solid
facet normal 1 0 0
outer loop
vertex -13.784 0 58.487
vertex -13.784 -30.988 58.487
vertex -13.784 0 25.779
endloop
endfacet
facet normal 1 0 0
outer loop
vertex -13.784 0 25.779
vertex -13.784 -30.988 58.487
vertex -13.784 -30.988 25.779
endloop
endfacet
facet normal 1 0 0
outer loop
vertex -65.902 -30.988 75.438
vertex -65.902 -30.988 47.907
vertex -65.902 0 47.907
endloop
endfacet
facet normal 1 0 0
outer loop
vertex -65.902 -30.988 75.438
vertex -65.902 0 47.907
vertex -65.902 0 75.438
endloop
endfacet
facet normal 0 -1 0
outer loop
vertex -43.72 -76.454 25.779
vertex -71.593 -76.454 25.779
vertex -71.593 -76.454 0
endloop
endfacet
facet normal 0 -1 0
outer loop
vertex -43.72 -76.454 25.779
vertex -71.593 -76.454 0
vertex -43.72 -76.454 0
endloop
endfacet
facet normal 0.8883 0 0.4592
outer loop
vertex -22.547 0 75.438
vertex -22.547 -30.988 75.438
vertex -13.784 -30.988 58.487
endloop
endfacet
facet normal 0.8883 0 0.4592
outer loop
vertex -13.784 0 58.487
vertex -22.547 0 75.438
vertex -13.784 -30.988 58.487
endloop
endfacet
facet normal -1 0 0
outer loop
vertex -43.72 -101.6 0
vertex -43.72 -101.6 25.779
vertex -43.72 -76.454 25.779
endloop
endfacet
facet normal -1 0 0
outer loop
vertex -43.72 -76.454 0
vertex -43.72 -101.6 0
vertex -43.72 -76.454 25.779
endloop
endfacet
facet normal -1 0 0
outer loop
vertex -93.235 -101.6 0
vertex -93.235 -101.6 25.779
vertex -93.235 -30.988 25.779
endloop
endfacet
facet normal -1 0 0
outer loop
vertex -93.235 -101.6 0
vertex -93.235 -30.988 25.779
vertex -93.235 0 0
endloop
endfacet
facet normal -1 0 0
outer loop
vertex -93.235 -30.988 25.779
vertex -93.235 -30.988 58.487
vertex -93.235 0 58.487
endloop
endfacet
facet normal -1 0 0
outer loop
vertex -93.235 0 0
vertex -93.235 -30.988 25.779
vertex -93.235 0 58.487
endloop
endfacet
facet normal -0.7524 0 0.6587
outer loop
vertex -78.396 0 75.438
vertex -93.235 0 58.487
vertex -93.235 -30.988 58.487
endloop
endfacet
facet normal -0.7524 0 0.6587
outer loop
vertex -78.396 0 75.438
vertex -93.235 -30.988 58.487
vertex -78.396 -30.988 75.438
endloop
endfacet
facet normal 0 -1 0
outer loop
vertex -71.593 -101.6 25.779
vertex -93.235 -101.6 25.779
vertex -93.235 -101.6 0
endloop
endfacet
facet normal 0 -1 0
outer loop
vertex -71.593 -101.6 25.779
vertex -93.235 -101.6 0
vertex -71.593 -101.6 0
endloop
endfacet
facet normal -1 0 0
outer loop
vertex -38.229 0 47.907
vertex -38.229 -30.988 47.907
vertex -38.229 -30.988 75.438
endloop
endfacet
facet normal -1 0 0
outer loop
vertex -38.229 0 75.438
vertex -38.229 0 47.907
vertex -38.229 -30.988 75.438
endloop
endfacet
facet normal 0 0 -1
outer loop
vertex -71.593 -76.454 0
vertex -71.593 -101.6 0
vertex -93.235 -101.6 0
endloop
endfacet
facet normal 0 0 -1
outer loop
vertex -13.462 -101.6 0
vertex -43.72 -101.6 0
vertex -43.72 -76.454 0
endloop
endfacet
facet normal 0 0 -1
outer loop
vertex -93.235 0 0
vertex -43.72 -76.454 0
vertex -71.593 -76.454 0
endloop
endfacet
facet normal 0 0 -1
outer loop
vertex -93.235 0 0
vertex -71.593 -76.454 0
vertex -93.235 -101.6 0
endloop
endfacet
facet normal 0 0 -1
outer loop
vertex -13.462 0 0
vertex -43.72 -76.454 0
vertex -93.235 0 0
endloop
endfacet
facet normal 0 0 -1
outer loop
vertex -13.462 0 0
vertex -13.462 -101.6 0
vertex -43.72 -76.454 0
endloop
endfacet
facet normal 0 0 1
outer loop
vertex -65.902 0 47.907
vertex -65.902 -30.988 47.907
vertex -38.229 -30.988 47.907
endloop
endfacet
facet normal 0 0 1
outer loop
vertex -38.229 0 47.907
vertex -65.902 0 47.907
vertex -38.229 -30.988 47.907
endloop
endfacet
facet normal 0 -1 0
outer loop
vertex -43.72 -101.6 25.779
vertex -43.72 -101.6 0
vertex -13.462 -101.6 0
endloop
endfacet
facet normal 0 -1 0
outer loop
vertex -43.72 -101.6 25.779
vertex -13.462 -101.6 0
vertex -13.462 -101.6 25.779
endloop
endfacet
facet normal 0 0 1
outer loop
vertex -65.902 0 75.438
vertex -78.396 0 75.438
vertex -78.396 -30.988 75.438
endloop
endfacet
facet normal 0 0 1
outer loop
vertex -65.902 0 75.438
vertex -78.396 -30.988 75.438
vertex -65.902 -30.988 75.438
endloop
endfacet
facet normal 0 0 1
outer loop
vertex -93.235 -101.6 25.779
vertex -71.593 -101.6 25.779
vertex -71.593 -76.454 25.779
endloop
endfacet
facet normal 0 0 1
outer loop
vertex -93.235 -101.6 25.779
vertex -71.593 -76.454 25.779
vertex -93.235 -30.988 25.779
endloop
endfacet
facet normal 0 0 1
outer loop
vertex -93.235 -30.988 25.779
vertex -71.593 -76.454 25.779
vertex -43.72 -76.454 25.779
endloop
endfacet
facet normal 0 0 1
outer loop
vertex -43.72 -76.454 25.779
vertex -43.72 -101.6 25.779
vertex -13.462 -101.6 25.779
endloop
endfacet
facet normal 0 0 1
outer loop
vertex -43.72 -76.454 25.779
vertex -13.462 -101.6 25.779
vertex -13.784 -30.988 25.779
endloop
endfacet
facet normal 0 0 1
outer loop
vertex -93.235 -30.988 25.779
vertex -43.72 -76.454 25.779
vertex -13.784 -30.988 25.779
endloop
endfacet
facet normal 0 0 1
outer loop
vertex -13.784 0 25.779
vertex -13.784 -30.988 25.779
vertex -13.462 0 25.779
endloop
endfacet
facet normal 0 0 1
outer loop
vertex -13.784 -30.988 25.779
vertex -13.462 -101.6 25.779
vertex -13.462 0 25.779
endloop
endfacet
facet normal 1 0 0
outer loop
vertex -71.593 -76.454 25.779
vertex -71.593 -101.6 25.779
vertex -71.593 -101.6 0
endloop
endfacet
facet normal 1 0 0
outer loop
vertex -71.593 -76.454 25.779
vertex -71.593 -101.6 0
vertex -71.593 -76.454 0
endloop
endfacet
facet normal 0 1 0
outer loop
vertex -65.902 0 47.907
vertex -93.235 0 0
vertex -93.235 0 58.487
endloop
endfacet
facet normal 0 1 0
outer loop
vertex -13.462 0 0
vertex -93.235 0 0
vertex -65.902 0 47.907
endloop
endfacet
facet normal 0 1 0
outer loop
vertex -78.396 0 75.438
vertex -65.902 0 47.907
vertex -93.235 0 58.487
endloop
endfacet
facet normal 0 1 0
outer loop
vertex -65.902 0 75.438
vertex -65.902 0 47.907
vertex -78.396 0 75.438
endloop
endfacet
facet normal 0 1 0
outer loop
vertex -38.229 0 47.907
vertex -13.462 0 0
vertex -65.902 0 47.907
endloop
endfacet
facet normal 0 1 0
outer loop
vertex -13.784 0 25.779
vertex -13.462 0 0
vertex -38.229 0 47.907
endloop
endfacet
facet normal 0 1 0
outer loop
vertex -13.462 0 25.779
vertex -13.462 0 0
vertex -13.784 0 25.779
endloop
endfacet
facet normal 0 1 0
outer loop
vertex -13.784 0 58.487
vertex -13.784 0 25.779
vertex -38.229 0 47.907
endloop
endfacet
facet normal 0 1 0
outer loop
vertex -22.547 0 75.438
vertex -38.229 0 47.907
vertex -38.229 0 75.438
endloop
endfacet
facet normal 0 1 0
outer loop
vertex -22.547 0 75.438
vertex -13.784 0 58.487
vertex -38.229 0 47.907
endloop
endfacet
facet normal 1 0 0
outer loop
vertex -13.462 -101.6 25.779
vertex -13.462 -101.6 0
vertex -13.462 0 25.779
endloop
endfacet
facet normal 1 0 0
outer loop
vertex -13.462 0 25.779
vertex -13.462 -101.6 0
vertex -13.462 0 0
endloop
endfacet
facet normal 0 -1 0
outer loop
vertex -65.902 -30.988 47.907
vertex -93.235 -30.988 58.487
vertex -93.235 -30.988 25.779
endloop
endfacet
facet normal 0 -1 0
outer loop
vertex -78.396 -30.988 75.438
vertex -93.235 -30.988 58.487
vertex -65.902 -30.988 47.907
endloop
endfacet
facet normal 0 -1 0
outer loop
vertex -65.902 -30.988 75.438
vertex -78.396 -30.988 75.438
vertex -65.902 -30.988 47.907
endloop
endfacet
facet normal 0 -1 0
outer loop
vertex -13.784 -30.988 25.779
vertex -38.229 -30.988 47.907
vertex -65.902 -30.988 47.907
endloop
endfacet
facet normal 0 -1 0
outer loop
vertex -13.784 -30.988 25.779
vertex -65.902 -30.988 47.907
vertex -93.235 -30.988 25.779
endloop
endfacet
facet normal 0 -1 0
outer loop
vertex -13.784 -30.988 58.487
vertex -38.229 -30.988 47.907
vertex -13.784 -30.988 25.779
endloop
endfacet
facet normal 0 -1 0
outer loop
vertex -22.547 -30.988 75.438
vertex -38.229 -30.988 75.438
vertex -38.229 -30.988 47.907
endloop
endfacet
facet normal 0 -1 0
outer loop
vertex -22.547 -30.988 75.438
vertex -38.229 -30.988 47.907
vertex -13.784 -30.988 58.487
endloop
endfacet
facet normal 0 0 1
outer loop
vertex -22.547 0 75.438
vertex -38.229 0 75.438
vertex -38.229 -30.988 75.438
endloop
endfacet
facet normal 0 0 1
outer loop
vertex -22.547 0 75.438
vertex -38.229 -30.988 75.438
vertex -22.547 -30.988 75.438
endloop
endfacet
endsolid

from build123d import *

# Parameters (mm, degrees)
F0_W      = 101.6
F0_H      = 101.6
F1_DEPTH  = 75.438
F2_W      = 28.0288234353
F2_H      = 9.1542927548
F3_DEPTH  = 25.4
F4_W      = 101.6
F4_H      = 49.6587024246
F5_DEPTH  = 70.612
F6_W      = 27.8729833663
F6_H      = 25.5314931273
F7_DEPTH  = 25.146
F9_DEPTH  = 68.072
F10_DEPTH = 25.4
F12_DEPTH = 60.96
F13_W     = 27.6737101376
F13_H     = 27.5311653678
F14_DEPTH = 72.136
F15_DEPTH = 13.716
F16_DEPTH = 13.462
F18_DEPTH = 43.434


with BuildPart() as f1:
    # F0 (on Top) → F1 (new body)
    with BuildSketch(Plane.XY):
        with Locations((-50.8, -50.8)):
            Rectangle(F0_W, F0_H)
    extrude(amount=F1_DEPTH)

    # F2 (on face) → F3 (cut)
    with BuildSketch(Plane.XZ.offset(101.6)):
        with Locations((-57.5784109533, -4.5771463774)):
            Rectangle(F2_W, F2_H)
    extrude(amount=-F3_DEPTH, mode=Mode.SUBTRACT)

    # F4 (on face) → F5 (cut)
    with BuildSketch(Plane.XZ.offset(101.6)):
        with Locations((-50.8, 50.6086487877)):
            Rectangle(F4_W, F4_H)
    extrude(amount=-F5_DEPTH, mode=Mode.SUBTRACT)

    # F6 (on face) → F7 (cut)
    with BuildSketch(Plane.XZ.offset(101.6)):
        with Locations((-57.6563309878, 13.0135510117)):
            Rectangle(F6_W, F6_H)
    extrude(amount=-F7_DEPTH, mode=Mode.SUBTRACT)

    # F8 (on face) → F9 (cut)
    with BuildSketch(Plane.XZ.offset(30.988)):
        Polygon((-93.2351276278, 58.4865286946), (-78.3963426948, 75.438), (-101.6, 75.438), (-101.6, 25.7792975754), (-93.2351276278, 25.7792975754), align=None)
    extrude(amount=-F9_DEPTH, mode=Mode.SUBTRACT)

    # F10 (cut): a face of the model
    f10_faces = [f1.faces().sort_by_distance(p)[0] for p in [
        (-57.6563309878, -89.027, 0.247804448),
    ]]
    extrude(f10_faces, amount=-F10_DEPTH, mode=Mode.SUBTRACT)

    # F11 (on face) → F12 (cut)
    with BuildSketch(Plane.XZ.offset(30.988)):
        Polygon((0, 75.438), (-22.546928376, 75.438), (-13.7835862115, 58.4865286946), (-13.7835862115, 25.7792975754), (0, 25.7792975754), align=None)
    extrude(amount=-F12_DEPTH, mode=Mode.SUBTRACT)

    # F13 (on face) → F14 (cut)
    with BuildSketch(Plane.XZ.offset(30.988)):
        with Locations((-52.0655419677, 61.6724173161)):
            Rectangle(F13_W, F13_H)
    extrude(amount=-F14_DEPTH, mode=Mode.SUBTRACT)

    # F15 (add): a face of the model
    f15_faces = [f1.faces().sort_by_distance(p)[0] for p in [
        (0, -50.8, 12.8896487877),
    ]]
    extrude(f15_faces, amount=-F15_DEPTH)

    # F16 (cut): a face of the model
    f16_faces = [f1.faces().sort_by_distance(p)[0] for p in [
        (0, -50.8, 12.8896487877),
    ]]
    extrude(f16_faces, amount=-F16_DEPTH, mode=Mode.SUBTRACT)

    # F17 (on face) → F18 (cut)
    with BuildSketch(Plane.XY.offset(25.7792975754)):
        Polygon((-93.2351276278, -101.6), (-93.2351276278, -30.988), (-93.2351276278, 0), (-101.6, 0), (-101.6, -101.6), align=None)
    extrude(amount=-F18_DEPTH, mode=Mode.SUBTRACT)


solid = f1.part
